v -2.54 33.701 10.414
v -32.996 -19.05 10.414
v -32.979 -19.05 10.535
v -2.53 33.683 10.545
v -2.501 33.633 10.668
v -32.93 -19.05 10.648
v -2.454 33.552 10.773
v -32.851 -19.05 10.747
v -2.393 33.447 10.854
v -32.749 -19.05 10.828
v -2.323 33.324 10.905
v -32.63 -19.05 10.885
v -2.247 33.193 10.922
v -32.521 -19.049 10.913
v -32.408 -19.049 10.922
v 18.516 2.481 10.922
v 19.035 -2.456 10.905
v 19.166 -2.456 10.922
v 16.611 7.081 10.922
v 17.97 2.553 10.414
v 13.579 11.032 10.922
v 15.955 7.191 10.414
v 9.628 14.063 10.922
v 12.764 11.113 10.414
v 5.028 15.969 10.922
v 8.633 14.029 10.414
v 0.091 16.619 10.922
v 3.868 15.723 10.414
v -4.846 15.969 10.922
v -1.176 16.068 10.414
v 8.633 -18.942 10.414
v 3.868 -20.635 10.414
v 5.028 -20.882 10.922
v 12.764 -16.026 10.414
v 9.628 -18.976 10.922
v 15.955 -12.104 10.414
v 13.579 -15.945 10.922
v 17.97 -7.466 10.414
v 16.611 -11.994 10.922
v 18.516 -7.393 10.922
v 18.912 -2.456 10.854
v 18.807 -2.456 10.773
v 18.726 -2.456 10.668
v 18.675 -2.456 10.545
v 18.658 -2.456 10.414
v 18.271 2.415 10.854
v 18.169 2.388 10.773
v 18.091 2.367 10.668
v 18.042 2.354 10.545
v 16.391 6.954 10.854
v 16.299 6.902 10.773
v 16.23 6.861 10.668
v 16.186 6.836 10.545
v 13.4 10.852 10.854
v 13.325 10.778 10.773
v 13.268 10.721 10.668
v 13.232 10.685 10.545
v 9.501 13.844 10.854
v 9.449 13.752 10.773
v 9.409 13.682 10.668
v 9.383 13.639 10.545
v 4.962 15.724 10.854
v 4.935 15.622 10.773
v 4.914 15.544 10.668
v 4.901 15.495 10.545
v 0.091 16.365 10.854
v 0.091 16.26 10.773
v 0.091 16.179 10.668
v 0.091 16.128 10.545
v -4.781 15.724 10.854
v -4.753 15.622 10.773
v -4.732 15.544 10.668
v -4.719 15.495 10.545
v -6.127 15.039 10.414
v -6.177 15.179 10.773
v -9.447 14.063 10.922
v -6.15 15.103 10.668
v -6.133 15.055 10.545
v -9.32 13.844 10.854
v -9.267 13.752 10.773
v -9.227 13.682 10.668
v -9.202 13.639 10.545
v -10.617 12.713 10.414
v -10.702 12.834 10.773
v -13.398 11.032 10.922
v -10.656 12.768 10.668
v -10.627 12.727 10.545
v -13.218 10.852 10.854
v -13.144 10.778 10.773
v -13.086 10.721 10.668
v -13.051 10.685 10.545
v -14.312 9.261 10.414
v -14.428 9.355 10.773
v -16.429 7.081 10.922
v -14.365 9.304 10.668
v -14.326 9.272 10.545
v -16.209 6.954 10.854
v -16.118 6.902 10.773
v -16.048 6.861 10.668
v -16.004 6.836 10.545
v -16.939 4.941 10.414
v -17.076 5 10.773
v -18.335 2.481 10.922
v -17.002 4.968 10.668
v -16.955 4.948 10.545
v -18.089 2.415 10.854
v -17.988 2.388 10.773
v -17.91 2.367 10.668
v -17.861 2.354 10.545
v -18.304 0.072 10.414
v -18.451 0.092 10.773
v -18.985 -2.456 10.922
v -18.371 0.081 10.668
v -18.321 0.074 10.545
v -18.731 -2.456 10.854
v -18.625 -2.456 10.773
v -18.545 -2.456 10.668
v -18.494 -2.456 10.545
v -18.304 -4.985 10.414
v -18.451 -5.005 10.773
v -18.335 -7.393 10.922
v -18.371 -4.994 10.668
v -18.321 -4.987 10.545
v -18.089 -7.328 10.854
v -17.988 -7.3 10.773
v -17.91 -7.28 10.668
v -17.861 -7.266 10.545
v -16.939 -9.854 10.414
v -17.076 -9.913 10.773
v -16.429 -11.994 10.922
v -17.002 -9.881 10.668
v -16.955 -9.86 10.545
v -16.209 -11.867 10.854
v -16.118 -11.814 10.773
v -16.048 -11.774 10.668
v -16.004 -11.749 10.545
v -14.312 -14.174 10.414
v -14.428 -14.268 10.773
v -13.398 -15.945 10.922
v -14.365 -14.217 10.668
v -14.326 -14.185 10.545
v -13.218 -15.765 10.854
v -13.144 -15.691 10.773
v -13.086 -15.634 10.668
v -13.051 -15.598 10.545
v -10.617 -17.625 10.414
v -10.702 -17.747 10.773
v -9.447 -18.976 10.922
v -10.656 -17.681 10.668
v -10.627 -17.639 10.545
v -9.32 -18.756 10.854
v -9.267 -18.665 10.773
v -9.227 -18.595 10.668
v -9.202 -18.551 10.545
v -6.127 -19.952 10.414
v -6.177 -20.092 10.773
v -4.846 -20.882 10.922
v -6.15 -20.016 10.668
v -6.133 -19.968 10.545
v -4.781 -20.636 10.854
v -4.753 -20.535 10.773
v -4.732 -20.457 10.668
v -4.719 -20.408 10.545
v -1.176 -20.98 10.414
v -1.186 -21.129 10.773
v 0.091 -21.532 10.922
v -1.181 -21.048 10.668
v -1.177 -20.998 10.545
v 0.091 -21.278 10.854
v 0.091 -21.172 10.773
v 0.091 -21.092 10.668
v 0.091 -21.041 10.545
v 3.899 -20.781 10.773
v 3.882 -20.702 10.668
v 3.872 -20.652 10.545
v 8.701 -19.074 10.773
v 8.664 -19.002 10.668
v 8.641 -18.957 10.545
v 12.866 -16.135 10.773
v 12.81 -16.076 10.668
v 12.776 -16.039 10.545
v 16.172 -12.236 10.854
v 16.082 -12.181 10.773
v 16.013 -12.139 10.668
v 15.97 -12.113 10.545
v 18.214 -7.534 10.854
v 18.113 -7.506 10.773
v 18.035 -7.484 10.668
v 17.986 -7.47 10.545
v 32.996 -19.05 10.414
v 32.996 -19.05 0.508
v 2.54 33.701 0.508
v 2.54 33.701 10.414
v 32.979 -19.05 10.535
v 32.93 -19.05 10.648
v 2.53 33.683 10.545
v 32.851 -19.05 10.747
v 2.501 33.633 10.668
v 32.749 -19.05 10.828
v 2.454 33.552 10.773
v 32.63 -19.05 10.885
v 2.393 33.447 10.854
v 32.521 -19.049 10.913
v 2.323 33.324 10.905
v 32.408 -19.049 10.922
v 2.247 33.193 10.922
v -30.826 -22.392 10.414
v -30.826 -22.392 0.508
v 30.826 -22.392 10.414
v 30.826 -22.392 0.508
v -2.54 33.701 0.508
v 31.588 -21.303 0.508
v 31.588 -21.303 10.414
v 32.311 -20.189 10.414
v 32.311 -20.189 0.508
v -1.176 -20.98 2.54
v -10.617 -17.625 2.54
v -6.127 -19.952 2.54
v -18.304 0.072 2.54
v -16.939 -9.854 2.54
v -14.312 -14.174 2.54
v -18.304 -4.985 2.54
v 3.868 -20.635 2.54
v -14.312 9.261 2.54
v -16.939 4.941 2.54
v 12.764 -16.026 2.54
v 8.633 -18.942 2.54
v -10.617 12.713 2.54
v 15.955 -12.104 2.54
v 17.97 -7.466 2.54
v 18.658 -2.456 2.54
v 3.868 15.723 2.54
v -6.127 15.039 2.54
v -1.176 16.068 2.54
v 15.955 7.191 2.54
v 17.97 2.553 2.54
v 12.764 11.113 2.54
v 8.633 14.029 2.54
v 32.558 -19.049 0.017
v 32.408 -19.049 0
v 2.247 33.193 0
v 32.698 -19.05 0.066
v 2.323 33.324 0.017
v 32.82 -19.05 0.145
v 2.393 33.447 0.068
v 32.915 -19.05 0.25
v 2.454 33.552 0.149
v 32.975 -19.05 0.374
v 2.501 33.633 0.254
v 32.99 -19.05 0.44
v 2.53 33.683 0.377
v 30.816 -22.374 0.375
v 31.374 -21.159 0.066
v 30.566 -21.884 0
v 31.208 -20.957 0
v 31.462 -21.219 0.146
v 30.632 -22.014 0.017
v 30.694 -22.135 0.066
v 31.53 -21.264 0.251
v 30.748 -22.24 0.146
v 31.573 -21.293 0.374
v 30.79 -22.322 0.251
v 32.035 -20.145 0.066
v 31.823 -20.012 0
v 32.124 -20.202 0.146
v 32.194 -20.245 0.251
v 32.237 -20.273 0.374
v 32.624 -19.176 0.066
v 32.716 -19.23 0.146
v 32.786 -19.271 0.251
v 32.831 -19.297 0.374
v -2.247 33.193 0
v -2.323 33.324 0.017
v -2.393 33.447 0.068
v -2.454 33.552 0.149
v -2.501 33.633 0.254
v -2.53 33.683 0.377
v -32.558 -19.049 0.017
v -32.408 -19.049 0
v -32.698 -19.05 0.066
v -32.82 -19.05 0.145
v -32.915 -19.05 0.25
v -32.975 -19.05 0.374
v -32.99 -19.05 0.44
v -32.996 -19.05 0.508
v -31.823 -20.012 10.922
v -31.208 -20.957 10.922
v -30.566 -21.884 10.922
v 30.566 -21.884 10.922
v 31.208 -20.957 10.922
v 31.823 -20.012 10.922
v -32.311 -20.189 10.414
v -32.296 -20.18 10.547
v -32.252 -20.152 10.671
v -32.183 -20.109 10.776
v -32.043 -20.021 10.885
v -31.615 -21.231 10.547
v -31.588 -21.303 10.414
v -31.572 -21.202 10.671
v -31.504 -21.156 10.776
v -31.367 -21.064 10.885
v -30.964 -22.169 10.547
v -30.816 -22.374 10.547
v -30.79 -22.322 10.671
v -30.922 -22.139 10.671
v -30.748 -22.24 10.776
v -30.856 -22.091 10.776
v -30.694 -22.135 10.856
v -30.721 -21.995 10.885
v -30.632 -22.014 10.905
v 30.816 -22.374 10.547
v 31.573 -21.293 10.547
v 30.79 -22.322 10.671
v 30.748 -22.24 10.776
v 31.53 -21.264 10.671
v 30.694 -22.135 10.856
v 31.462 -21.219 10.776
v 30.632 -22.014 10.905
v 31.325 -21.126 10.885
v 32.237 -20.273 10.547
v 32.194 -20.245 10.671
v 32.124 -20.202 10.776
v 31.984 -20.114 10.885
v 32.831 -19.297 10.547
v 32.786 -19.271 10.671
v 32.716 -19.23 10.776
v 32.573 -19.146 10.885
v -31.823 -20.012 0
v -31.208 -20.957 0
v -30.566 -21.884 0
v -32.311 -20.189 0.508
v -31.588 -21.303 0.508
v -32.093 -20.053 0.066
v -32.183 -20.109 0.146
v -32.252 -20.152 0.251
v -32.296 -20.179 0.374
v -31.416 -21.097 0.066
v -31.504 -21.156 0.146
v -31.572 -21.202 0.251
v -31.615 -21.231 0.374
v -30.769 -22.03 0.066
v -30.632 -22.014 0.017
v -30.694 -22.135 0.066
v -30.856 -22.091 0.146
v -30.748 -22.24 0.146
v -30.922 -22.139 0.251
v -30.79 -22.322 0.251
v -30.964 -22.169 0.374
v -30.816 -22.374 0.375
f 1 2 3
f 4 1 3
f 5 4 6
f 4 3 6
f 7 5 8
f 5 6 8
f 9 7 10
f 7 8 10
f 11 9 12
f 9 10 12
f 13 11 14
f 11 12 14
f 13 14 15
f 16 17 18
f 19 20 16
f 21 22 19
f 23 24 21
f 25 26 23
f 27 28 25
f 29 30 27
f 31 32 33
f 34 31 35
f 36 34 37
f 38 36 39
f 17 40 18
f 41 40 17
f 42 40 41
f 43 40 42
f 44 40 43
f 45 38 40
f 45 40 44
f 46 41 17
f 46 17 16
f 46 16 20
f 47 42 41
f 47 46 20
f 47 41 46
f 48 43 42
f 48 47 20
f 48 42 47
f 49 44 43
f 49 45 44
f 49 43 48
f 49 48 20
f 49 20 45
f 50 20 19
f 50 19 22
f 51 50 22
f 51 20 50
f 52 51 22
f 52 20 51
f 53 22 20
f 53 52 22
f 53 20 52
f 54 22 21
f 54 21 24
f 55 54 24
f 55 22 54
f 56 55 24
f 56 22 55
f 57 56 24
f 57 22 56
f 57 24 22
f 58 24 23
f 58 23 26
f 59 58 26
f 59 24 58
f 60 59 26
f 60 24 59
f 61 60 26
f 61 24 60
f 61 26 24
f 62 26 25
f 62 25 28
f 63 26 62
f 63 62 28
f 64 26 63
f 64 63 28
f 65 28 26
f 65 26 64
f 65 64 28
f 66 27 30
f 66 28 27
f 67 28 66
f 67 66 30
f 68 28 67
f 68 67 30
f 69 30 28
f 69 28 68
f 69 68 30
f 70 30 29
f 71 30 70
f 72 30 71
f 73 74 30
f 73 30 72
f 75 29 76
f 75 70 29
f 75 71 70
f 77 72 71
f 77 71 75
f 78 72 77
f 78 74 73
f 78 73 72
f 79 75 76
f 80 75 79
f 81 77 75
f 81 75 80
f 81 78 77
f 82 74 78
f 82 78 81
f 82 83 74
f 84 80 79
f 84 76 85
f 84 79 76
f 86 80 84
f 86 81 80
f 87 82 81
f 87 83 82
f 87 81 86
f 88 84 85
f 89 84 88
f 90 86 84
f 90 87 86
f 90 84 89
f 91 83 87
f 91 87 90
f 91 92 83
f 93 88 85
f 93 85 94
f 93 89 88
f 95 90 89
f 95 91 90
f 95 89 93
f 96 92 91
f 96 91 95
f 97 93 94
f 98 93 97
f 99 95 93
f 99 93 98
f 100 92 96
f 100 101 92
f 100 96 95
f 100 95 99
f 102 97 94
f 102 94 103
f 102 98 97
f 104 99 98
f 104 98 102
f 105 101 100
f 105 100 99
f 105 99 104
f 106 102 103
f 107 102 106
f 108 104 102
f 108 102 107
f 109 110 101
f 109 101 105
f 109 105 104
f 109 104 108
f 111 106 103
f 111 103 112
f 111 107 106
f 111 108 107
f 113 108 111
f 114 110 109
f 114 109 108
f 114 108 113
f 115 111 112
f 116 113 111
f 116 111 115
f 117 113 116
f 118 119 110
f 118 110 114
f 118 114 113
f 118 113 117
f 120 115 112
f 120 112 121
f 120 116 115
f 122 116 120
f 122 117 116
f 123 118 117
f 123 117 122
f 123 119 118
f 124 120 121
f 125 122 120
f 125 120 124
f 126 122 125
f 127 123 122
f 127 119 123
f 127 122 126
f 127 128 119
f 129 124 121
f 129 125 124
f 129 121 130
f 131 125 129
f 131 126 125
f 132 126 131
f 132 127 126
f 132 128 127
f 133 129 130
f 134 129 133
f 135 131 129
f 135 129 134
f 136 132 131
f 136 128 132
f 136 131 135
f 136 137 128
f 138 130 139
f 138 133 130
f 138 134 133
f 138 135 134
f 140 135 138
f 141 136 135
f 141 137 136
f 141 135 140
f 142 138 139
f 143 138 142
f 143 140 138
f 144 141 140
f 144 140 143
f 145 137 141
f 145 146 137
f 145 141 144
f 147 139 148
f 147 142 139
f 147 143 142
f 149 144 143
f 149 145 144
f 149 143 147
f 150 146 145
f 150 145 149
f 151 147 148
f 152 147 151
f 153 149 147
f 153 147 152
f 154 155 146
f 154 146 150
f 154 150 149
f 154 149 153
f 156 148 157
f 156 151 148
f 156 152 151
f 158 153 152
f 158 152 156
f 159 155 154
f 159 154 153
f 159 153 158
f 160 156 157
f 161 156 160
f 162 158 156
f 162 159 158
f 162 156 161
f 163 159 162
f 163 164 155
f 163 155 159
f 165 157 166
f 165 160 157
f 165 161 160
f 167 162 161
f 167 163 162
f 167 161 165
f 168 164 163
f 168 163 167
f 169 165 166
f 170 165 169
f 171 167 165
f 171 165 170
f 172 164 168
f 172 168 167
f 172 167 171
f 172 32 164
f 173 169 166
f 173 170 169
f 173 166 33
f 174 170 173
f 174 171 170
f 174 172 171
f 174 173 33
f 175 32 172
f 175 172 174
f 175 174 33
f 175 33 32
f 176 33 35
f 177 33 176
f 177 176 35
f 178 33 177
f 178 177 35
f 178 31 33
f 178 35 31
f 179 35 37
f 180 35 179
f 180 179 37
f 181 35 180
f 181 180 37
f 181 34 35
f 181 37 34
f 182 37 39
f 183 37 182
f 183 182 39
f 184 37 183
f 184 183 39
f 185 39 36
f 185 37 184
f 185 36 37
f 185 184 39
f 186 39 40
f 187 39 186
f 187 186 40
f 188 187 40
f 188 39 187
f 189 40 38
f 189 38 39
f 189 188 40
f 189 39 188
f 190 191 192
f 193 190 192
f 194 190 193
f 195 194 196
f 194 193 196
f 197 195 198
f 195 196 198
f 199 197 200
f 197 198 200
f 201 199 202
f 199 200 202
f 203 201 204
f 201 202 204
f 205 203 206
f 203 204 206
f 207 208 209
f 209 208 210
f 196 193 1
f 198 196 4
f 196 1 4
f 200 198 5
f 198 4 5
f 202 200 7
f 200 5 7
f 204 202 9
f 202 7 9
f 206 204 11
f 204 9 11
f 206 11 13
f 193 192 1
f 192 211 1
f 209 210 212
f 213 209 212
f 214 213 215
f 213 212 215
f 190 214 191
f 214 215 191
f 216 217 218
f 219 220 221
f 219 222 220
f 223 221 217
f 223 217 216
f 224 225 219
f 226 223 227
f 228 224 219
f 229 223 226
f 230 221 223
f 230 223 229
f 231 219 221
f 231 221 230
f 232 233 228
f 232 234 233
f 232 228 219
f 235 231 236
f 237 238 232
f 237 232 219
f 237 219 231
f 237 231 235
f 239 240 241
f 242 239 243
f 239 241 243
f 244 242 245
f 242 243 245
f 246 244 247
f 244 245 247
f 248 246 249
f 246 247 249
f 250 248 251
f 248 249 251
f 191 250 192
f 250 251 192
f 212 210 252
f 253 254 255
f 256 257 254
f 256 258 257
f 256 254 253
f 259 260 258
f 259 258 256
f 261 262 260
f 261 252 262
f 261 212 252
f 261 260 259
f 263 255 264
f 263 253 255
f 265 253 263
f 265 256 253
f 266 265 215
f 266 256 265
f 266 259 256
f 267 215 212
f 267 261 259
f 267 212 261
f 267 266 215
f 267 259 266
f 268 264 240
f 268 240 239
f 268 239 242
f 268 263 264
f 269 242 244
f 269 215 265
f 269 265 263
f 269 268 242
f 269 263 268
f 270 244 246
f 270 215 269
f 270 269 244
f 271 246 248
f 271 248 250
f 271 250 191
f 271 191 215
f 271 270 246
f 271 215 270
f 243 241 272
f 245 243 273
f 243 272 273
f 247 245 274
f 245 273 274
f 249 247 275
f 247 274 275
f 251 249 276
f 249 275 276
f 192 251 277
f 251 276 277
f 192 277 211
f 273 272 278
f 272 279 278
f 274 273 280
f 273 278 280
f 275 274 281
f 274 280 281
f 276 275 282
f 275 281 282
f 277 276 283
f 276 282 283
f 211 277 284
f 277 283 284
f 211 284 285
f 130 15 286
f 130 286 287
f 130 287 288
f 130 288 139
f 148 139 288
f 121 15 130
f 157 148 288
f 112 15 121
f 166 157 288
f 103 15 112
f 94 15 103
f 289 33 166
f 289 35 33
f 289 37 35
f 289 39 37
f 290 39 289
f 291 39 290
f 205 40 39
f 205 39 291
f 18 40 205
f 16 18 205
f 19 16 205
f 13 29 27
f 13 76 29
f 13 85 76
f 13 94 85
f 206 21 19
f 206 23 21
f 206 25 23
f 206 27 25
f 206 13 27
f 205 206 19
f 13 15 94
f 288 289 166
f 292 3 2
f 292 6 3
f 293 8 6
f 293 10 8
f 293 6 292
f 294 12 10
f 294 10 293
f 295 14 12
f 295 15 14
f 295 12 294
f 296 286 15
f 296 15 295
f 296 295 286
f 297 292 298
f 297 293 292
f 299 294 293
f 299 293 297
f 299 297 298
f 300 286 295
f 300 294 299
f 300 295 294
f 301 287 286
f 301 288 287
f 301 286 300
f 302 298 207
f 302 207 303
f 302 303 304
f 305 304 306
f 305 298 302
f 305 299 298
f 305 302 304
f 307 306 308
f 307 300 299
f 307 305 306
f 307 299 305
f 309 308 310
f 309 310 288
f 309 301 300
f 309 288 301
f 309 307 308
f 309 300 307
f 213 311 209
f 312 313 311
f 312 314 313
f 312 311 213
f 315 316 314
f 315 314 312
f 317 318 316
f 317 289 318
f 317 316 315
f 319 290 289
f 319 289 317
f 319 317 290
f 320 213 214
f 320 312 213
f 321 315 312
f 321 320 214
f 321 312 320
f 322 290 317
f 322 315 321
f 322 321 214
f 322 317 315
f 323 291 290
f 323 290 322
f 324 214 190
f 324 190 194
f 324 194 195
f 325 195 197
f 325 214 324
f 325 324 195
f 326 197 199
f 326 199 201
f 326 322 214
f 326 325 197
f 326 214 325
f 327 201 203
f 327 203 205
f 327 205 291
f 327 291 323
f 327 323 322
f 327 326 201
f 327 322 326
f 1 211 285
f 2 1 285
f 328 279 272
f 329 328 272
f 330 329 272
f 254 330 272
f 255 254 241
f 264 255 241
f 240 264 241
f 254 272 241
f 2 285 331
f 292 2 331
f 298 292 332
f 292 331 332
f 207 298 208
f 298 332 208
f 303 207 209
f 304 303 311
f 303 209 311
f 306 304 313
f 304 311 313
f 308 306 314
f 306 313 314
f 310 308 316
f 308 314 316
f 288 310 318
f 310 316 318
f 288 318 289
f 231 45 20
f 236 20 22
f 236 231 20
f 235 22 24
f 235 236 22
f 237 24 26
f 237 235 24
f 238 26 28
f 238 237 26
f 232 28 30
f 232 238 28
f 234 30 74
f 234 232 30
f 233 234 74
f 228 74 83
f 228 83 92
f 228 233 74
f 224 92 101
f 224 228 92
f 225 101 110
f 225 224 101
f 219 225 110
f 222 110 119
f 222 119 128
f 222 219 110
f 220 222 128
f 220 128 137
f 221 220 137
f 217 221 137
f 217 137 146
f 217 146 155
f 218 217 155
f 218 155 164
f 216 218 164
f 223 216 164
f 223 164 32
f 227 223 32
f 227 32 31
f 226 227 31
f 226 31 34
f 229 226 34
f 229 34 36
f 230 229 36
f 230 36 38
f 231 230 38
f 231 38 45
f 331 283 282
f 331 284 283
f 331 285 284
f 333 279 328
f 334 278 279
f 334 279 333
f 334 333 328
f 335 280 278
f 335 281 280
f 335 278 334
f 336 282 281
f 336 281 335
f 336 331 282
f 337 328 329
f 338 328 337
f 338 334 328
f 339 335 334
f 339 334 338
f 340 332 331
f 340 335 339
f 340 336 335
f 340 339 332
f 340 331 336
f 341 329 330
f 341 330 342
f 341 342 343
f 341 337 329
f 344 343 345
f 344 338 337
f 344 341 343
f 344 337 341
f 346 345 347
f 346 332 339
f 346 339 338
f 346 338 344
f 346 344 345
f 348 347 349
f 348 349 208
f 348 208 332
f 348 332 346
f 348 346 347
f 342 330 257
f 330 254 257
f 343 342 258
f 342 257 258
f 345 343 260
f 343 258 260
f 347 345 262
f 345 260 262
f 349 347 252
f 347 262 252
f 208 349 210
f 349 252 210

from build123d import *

# Parameters (mm, degrees)
F0_R     = 18.5674
F1_DEPTH = 10.922
F2_R     = 19.685
F3_DEPTH = 2.54
F4_SIZE  = 5.08
F5_R     = 0.508


with BuildPart() as f1:
    # F0 (on Top) → F1 (new body)
    with BuildSketch(Plane.XY):
        with BuildLine():
            Line((32.995568, -19.05), (0, 38.1))
            Line((0, 38.1), (-32.995568, -19.05))
            ThreePointArc((-32.995568, -19.05), (-31.954272, -20.749325), (-30.825541, -22.391874))
            Line((-30.825541, -22.391874), (30.825541, -22.391874))
            ThreePointArc((30.825541, -22.391874), (31.954272, -20.749325), (32.995568, -19.05))
        make_face()
        with Locations((0.09078, -2.456299)):
            Circle(F0_R, mode=Mode.SUBTRACT)
    extrude(amount=F1_DEPTH)

    # F2 (on Top) → F3 (join)
    with BuildSketch(Plane.XY):
        with Locations((0, -2.395251)):
            Circle(F2_R)
    extrude(amount=F3_DEPTH)

    # F4
    f4_edges = [f1.edges().sort_by_distance(p)[0] for p in [
        (0, 38.1, 5.461),
    ]]
    chamfer(f4_edges, length=F4_SIZE)

    # F5
    f5_edges = [f1.edges().sort_by_distance(p)[0] for p in [
        (17.767784, 7.325295, 10.922),
        (0, 33.700591, 10.922),
        (31.954272, -20.749325, 10.922),
        (-17.767784, 7.325295, 10.922),
        (0, -22.391874, 10.922),
        (-31.954272, -20.749325, 10.922),
        (-18.47662, -2.456299, 10.922),
        (17.767784, 7.325295, 0),
        (0, 33.700591, 0),
        (31.954272, -20.749325, 0),
        (-17.767784, 7.325295, 0),
        (0, -22.391874, 0),
        (-31.954272, -20.749325, 0),
    ]]
    fillet(f5_edges, radius=F5_R)


solid = f1.part
